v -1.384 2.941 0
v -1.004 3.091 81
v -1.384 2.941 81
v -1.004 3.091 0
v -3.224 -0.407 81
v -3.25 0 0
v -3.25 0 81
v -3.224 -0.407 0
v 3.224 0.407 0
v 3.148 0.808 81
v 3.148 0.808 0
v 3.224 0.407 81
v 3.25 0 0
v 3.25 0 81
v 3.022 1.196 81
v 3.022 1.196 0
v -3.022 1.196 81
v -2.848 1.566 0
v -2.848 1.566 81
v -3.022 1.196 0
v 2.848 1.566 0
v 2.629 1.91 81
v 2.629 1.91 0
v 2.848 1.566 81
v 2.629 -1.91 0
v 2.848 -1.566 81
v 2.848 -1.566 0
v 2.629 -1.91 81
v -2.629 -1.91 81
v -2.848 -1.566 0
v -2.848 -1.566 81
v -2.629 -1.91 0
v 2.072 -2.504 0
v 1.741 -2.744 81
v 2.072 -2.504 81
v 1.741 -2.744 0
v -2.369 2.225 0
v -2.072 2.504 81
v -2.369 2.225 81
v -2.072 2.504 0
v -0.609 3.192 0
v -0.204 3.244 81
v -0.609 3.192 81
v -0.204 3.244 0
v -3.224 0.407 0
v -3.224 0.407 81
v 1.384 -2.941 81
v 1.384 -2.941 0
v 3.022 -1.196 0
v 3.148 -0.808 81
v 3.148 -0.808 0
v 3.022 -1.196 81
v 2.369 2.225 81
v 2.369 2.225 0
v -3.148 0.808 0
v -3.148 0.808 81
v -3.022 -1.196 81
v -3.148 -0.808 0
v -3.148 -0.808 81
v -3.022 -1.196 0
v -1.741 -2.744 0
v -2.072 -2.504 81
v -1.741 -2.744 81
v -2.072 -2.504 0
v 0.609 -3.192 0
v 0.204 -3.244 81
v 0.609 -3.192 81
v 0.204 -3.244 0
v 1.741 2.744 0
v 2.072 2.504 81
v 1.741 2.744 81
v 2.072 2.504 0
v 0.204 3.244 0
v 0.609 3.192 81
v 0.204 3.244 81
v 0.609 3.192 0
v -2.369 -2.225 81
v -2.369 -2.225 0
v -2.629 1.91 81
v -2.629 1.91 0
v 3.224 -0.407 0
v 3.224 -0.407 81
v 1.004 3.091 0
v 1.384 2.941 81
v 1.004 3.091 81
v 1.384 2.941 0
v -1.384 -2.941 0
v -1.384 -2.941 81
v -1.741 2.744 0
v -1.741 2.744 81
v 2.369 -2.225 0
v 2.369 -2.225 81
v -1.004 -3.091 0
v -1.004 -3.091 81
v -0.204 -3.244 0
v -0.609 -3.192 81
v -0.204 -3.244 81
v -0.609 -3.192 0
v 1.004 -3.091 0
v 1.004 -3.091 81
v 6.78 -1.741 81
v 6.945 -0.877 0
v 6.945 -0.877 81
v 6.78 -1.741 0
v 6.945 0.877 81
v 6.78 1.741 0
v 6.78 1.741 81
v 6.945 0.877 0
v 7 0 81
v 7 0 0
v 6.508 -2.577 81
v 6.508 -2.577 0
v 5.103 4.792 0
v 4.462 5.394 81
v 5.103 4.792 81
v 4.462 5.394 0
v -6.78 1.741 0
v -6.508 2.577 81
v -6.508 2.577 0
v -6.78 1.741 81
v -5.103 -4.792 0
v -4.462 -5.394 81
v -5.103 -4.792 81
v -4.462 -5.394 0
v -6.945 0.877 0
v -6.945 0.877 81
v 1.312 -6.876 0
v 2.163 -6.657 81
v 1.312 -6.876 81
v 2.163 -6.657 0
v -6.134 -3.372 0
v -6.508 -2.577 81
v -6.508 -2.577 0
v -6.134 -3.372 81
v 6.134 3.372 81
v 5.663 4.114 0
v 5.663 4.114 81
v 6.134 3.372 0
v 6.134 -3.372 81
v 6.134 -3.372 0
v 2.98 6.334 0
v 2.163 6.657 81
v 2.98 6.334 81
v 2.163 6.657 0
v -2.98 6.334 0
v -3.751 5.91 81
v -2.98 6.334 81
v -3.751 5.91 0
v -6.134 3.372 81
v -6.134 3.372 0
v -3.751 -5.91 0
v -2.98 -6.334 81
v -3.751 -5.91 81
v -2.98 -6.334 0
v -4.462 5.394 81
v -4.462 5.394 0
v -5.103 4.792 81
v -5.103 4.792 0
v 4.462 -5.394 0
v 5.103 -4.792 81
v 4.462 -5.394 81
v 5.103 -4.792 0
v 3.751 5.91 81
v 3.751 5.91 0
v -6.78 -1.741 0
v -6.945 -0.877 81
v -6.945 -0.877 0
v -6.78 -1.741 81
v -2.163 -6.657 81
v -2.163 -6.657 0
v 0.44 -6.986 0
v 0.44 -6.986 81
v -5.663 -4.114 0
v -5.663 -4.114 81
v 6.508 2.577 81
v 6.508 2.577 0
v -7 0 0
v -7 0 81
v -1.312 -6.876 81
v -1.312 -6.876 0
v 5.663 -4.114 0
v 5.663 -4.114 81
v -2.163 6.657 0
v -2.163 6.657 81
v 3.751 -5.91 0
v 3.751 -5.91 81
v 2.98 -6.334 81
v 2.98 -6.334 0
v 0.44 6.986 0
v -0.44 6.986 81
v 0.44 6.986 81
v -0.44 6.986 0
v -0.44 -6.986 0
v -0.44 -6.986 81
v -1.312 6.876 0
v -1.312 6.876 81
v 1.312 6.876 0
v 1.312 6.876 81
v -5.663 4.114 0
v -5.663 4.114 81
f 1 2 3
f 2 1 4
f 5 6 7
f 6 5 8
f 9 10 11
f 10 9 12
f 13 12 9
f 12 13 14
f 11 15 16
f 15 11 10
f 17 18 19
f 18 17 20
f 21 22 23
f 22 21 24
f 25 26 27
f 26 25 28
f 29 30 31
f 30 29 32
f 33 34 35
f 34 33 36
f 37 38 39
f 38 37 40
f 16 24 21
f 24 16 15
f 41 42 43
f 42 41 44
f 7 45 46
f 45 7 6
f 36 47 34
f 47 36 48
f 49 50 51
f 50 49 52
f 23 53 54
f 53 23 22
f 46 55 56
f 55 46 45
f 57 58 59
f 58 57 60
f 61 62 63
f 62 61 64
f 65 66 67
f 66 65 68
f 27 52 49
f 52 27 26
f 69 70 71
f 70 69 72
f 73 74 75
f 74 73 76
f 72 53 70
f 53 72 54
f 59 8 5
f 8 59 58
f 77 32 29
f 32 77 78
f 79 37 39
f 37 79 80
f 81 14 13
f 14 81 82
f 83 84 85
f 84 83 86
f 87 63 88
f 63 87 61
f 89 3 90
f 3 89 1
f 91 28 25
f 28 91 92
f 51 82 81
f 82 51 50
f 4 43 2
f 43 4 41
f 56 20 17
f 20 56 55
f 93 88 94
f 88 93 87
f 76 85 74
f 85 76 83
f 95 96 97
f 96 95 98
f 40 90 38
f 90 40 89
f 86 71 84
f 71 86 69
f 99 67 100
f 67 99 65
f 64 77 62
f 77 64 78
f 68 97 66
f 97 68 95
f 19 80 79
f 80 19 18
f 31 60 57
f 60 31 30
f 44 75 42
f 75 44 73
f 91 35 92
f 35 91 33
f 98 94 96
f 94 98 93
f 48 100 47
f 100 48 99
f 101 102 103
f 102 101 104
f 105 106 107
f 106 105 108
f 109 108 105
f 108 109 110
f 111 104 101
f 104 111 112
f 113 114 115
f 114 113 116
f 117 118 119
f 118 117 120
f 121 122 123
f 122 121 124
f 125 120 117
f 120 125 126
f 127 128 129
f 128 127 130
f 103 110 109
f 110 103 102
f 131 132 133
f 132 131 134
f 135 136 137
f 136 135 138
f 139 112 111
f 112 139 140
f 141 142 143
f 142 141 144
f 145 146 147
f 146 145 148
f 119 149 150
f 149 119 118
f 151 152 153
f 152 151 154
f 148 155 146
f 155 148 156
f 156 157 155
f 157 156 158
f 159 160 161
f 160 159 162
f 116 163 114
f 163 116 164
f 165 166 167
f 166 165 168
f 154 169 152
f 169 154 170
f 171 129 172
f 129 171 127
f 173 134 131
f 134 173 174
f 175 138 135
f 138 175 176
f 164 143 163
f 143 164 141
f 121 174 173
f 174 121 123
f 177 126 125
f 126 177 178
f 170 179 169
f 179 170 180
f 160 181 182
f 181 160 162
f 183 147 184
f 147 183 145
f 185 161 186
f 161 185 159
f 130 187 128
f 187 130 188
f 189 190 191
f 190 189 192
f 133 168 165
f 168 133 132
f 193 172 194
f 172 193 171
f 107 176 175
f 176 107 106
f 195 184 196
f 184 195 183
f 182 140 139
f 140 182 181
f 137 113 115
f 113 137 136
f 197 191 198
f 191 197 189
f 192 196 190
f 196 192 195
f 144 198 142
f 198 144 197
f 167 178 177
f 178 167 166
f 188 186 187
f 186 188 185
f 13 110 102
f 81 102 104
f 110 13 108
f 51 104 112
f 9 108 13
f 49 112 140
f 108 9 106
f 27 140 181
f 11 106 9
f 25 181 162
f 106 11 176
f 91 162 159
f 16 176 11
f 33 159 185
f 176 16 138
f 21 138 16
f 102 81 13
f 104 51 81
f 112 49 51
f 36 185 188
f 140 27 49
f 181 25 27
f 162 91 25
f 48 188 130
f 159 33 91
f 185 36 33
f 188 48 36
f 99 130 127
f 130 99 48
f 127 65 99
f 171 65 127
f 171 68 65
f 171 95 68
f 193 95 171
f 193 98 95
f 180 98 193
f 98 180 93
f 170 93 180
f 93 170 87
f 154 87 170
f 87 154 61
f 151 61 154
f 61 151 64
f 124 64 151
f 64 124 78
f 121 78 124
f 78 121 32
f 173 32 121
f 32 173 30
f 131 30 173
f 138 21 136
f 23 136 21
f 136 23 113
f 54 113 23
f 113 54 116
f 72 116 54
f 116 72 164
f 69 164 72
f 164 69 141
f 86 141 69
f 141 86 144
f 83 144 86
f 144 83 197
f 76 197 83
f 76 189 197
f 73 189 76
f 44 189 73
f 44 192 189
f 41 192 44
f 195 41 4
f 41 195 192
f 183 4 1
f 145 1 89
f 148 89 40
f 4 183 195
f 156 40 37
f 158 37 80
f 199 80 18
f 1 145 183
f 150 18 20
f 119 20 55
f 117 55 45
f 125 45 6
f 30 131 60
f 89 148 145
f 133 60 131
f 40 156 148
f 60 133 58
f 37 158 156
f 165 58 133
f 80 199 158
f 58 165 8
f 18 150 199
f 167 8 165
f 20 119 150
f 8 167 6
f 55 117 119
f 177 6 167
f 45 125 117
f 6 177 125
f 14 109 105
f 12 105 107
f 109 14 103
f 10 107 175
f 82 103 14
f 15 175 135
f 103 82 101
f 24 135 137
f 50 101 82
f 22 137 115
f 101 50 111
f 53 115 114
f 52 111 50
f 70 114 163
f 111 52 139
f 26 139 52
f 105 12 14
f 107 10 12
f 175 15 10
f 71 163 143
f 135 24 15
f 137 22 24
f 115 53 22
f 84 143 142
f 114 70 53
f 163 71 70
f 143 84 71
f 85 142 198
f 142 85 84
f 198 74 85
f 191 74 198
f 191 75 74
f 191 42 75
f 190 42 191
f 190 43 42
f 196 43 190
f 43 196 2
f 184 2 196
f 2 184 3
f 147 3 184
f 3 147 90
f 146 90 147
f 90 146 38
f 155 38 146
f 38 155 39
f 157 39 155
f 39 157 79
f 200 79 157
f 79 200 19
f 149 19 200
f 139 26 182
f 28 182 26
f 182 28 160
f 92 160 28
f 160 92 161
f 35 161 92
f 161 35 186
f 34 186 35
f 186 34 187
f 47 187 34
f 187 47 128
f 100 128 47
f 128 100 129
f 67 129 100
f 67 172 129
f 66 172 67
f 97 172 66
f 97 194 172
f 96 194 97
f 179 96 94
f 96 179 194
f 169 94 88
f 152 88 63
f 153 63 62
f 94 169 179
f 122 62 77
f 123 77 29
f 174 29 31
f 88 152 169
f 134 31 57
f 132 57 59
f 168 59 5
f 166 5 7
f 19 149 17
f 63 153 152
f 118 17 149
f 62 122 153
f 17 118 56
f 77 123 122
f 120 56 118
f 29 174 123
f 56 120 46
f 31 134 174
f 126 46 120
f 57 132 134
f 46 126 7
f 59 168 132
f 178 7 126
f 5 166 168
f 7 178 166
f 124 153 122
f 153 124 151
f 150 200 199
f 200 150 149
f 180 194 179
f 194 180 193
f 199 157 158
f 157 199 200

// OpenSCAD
$fn = 50;


difference() {
	union() {
		cylinder(h = 81, r = 7.0000000000);
	}
	union() {
		translate(v = [0.0000000000, 0.0000000000, -100.0000000000]) {
			cylinder(h = 200, r = 3.2500000000);
		}
		cylinder(h = 81, r = 1.8000000000);
		cylinder(h = 81, r = 1.8000000000);
		cylinder(h = 81, r = 1.8000000000);
	}
}
